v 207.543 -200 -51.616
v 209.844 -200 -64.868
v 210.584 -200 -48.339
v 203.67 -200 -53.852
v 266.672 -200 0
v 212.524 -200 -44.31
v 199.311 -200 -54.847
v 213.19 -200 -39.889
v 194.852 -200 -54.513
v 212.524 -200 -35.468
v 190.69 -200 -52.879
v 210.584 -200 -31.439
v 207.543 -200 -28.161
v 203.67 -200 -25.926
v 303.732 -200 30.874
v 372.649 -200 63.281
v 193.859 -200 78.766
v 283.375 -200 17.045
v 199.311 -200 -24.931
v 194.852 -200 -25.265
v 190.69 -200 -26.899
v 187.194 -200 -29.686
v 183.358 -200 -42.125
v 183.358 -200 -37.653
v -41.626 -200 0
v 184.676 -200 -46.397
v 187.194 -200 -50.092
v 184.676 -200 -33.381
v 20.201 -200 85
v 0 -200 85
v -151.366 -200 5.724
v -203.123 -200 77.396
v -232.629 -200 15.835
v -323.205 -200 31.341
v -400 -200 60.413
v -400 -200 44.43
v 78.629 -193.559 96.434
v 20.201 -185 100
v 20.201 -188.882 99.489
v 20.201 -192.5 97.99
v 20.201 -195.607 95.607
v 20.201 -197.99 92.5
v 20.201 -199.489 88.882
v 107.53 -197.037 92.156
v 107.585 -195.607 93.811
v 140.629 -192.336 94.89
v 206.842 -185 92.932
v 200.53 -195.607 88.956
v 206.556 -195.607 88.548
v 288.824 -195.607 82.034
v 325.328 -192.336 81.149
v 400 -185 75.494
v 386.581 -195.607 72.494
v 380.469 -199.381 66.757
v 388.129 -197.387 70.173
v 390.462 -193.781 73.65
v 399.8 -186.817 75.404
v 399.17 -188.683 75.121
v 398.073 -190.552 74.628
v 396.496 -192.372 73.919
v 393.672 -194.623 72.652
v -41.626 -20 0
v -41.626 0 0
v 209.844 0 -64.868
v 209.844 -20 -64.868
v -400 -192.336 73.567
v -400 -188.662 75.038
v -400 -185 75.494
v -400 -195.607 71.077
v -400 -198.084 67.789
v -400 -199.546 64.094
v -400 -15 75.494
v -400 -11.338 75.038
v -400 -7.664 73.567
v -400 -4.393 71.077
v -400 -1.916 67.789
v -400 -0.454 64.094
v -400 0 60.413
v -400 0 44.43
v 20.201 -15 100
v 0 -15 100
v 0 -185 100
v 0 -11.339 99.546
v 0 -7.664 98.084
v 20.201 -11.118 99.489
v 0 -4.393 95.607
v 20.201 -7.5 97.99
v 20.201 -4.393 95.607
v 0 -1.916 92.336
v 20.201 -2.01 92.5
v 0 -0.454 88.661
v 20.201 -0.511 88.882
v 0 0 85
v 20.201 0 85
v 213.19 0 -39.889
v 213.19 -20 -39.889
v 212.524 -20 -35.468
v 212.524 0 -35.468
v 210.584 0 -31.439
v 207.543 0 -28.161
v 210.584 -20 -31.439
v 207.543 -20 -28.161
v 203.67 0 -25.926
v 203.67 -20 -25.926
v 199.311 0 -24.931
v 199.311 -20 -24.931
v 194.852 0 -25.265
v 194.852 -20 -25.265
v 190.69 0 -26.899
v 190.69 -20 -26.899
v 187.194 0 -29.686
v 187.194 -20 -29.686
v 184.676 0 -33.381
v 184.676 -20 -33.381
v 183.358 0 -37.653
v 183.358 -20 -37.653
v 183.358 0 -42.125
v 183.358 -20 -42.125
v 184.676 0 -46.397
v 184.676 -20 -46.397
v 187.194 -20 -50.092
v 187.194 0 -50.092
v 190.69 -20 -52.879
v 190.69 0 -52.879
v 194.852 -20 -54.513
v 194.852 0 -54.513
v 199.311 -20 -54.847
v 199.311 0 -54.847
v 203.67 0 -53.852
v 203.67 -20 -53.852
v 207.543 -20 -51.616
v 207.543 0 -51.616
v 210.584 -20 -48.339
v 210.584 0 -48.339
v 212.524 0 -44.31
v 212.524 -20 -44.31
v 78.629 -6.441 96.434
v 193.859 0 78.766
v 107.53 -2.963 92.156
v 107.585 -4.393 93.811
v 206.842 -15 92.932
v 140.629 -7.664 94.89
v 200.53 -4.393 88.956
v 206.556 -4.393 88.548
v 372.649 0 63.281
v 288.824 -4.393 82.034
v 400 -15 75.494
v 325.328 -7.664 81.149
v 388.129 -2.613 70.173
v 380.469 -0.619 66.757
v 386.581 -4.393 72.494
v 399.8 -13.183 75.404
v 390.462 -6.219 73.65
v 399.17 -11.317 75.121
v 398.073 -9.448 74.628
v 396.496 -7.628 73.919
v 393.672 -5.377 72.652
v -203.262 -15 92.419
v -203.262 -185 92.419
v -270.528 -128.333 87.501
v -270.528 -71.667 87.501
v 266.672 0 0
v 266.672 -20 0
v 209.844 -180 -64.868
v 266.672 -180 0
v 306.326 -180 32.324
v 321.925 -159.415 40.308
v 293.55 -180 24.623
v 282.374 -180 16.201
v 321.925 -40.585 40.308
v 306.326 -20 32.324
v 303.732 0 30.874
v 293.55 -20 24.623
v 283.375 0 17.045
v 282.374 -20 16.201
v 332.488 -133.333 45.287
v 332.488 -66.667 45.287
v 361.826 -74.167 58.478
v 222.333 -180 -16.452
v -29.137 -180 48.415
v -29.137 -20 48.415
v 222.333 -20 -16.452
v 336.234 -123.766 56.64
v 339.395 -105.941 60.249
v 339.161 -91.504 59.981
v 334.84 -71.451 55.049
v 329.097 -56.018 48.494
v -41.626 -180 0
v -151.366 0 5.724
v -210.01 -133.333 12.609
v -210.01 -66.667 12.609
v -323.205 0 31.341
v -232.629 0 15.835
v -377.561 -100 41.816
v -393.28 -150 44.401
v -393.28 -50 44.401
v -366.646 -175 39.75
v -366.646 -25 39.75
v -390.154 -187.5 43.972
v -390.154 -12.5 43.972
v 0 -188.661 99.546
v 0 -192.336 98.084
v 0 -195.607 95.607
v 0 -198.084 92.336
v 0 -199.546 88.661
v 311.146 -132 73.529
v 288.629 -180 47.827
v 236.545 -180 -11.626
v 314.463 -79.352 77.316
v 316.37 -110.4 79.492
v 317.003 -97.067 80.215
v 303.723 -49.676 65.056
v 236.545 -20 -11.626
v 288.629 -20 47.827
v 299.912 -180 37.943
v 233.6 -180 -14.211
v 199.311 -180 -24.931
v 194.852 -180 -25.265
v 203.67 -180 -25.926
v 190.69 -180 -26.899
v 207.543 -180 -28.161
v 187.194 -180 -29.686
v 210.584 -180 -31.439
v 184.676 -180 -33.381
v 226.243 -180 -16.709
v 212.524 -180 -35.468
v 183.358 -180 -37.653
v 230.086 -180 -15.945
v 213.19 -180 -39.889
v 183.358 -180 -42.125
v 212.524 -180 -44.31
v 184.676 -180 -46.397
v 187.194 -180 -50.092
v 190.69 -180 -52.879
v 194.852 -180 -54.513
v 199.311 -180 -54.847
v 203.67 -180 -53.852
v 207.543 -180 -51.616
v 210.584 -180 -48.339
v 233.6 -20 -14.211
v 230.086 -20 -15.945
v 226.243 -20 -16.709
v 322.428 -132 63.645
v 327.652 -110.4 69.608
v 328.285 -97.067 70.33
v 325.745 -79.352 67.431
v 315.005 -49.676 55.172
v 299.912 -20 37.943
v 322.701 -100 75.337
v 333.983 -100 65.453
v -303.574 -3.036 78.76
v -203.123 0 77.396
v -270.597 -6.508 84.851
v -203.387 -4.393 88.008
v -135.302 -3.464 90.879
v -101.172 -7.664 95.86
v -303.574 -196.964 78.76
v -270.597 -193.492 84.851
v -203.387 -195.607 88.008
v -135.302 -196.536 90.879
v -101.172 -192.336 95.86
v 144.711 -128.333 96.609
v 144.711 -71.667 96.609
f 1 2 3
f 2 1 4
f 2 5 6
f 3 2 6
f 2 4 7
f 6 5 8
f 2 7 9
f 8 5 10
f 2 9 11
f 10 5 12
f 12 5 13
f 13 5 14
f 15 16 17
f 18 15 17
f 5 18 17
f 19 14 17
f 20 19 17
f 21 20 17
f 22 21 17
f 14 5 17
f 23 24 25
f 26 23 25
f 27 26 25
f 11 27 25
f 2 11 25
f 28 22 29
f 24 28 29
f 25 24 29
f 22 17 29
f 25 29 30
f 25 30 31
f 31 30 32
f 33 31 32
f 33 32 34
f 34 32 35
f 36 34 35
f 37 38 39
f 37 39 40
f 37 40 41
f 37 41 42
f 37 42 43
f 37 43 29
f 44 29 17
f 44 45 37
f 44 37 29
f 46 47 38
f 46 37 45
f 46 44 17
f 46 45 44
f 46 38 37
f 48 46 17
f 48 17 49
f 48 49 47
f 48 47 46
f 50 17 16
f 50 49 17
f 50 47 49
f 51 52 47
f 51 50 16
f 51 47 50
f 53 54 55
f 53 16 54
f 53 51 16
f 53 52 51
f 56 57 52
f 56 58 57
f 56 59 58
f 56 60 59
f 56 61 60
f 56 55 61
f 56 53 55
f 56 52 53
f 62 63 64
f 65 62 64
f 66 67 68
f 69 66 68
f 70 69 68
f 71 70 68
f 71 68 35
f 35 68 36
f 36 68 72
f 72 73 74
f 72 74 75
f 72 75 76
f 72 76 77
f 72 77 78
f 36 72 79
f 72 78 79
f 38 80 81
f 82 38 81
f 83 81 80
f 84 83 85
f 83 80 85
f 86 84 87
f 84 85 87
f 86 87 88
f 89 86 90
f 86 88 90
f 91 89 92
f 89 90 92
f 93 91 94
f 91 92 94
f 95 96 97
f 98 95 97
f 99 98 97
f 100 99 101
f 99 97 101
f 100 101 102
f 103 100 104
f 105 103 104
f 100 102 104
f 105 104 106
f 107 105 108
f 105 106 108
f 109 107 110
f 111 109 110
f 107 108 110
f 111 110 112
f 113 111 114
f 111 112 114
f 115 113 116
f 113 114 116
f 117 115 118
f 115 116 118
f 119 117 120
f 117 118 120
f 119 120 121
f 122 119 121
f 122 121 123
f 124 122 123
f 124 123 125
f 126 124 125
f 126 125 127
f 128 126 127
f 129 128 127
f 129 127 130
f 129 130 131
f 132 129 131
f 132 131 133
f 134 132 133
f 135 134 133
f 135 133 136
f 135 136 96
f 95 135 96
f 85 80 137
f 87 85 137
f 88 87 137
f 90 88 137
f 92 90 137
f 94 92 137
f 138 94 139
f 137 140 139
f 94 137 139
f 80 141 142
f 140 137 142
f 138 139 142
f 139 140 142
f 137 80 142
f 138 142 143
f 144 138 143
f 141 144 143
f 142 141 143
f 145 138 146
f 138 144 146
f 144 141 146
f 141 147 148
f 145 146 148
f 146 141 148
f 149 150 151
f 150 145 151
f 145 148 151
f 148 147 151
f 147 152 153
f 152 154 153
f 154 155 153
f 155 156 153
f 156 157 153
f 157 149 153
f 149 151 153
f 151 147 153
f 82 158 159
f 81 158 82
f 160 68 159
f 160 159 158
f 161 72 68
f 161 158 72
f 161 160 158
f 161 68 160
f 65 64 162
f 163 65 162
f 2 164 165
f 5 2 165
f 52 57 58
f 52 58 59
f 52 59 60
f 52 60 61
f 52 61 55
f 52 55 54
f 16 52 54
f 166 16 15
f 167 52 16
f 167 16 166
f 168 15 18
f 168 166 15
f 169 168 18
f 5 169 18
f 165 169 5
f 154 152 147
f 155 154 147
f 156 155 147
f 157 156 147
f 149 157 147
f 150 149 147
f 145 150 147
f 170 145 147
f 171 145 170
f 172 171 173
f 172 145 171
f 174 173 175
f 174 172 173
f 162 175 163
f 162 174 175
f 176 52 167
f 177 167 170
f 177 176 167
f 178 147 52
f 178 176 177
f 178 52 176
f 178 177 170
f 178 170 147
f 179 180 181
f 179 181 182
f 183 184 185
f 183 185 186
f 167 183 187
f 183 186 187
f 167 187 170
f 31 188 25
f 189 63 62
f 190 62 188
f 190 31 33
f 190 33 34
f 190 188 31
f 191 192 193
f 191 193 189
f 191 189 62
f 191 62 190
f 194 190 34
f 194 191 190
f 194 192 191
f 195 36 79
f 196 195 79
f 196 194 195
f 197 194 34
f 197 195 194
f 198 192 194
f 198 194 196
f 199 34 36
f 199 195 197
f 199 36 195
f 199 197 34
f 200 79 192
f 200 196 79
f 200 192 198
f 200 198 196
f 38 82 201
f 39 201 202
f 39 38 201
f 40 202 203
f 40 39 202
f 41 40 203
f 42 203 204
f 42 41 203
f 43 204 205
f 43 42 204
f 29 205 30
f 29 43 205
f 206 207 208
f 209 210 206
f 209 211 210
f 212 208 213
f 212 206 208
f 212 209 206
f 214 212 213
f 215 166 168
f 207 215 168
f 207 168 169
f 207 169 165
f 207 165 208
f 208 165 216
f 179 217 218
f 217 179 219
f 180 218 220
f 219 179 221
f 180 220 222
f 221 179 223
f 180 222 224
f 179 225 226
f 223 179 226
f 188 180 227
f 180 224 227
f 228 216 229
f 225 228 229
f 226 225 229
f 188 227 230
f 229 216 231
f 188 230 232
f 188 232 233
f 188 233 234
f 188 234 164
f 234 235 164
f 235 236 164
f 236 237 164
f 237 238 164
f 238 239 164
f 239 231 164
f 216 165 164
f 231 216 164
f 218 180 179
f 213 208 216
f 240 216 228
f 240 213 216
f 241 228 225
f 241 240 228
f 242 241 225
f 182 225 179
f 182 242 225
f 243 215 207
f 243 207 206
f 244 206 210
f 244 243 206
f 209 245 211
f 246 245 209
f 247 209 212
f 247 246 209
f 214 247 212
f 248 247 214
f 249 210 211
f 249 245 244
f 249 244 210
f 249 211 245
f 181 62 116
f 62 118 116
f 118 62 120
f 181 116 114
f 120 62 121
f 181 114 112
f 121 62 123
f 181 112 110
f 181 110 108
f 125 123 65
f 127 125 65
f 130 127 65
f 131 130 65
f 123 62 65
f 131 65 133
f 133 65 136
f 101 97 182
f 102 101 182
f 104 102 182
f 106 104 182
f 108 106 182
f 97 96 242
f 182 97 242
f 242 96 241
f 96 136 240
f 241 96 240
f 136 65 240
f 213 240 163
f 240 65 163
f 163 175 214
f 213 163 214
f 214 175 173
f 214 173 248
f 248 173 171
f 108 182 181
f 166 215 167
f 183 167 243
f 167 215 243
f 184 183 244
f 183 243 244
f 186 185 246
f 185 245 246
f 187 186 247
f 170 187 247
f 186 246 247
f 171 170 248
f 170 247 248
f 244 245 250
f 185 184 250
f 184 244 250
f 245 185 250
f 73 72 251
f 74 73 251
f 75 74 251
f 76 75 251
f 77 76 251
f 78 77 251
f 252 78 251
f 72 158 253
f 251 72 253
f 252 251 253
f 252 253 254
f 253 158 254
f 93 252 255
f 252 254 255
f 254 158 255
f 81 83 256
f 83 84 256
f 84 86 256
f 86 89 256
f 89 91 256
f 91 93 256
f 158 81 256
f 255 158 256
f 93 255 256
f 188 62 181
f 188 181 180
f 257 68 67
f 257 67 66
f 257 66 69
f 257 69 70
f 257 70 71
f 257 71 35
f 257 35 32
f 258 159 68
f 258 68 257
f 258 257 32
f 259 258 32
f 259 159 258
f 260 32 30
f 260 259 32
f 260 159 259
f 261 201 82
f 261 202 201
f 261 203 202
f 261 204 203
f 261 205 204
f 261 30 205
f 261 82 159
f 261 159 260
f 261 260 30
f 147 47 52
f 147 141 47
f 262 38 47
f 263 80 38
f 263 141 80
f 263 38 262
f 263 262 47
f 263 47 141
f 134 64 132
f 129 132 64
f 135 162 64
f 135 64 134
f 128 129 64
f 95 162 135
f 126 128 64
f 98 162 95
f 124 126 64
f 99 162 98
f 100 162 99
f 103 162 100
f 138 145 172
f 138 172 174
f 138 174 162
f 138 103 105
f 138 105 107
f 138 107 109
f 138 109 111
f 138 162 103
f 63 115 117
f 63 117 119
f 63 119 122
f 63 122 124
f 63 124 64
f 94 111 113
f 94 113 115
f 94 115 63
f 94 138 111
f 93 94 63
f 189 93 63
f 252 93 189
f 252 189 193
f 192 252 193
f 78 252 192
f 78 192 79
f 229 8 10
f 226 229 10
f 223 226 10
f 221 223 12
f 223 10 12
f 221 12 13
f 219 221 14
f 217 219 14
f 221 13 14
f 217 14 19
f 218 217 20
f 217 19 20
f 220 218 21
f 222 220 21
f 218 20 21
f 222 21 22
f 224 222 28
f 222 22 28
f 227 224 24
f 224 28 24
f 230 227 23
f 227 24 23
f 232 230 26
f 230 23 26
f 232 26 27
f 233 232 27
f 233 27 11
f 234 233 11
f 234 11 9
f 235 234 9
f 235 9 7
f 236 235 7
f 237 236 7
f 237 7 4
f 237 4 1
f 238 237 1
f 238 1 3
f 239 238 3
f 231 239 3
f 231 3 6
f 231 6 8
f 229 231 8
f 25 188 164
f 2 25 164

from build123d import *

# Parameters (mm, degrees)
F1_DEPTH    = 200
F2_R        = 15
F4_DEPTH    = 15
F5_W        = 259.7017054144
F5_H        = 160
F6_DEPTH    = 50
F7_T1_DEPTH = 160
F8_R        = 15
F9_DEPTH    = 300


# Not quite as in the source:
# - a fillet or chamfer that OpenCascade refuses, or shapes differently, is made with other operations: its cross-section is extruded or revolved along the edge and cut away or added


with BuildPart() as f1:
    # F0 (on Front) → F1 (new body)
    with BuildSketch(Plane.XZ):
        with BuildLine():
            add(Edge.make_bspline(
                [(20.2008041868, 100), (146.0822657859, 99.5052919304), (265.431836351, 89.8162356005), (400, 75.4941478372)],
                knots=[0.5253173238, 0.5253173238, 0.5253173238, 0.5253173238, 1, 1, 1, 1], degree=3))
            Line((20.2008041868, 100), (0, 100))
            add(Edge.make_bspline(
                [(-400, 75.4941478372), (-275.3232982272, 88.4775108691), (-133.3944766528, 99.4743507493), (0, 100)],
                knots=[0, 0, 0, 0, 0.5, 0.5, 0.5, 0.5], degree=3))
            Line((-400, 75.4941478372), (-400, 44.4300249219))
            add(Edge.make_bspline(
                [(-41.6261814535, 0), (-214.6242707968, 0), (-393.6260249555, 49.33328574), (-400, 44.4300249219)],
                knots=[0, 0, 0, 0, 0.9473133281, 0.9473133281, 0.9473133281, 0.9473133281], degree=3))
            Line((-41.6261814535, 0), (209.8438292742, -64.8676306009))
            Line((209.8438292742, -64.8676306009), (266.6716873646, 0))
            add(Edge.make_bspline(
                [(400, 75.4941478372), (313.5865926743, 36.6108752787), (291.246175766, 29.9087464809), (266.6716873646, 0)],
                knots=[0, 0, 0, 0, 153.2181624608, 153.2181624608, 153.2181624608, 153.2181624608], degree=3))
        make_face()
    extrude(amount=F1_DEPTH)

    # F2
    f2_edges = [f1.edges().sort_by_distance(p)[0] for p in [
        (-200.289149, -200, 92.61289),
        (210.407204, -200, 92.68637),
        (-200.289149, 0, 92.61289),
        (10.100402, -200, 100),
        (10.100402, 0, 100),
        (210.407204, 0, 92.68637),
    ]]
    fillet(f2_edges, radius=F2_R)

    # F3 (on face) → F4 (cut, symmetric)
    with BuildSketch(Plane(origin=(150.8768626718, 0, -132.1770020211), x_dir=(0, 1, 0), z_dir=(0.7521818814, 0, -0.6589555503))):
        with BuildLine():
            Line((-180, 226.1682897806), (-180, 89.4854995586))
            Line((-180, 89.4854995586), (-20, 89.4854995586))
            Line((-20, 89.4854995586), (-20, 226.1682897806))
            add(Edge.make_bspline(
                [(-180, 226.1682897806), (-153.3333333333, 247.7404251695), (-100, 290.8846959472), (-46.6666666667, 247.7404251695), (-20, 226.1682897806)],
                knots=[0, 0, 0, 0, 0.5, 1, 1, 1, 1], degree=3))
        make_face()
    extrude(amount=F4_DEPTH, both=True, mode=Mode.SUBTRACT)

    # F5 (on face) → F6 (cut)
    with BuildSketch(Plane(origin=(-2.5970065182, 0, -10.0677217734), x_dir=(0.9683032706, 0, -0.2497774533), z_dir=(-0.2497774533, 0, -0.9683032706))):
        with Locations((89.5440850641, 100)):
            Rectangle(F5_W, F5_H)
    extrude(amount=-F6_DEPTH, mode=Mode.SUBTRACT)

    # F7: fillet of radius 15 on 1 edges, made by hand

    # F7_s2 → F7_t1 (cut)
    with BuildSketch(Plane.XZ.offset(20)):
        with BuildLine():
            ThreePointArc((236.54494855, -11.6256507443), (230.0859706945, -15.9445365763), (222.3327019401, -16.452467072))
            Line((222.3327019401, -16.452467072), (218.1662168076, -32.6045301468))
            Line((218.1662168076, -32.6045301468), (236.54494855, -11.6256507443))
        make_face()
    extrude(amount=F7_T1_DEPTH, mode=Mode.SUBTRACT)

    # F8 (on face) → F9 (cut)
    with BuildSketch(Plane.XZ.offset(200)):
        with Locations((198.1902569532, -39.8889631033)):
            Circle(F8_R)
    extrude(amount=-F9_DEPTH, mode=Mode.SUBTRACT)


solid = f1.part
